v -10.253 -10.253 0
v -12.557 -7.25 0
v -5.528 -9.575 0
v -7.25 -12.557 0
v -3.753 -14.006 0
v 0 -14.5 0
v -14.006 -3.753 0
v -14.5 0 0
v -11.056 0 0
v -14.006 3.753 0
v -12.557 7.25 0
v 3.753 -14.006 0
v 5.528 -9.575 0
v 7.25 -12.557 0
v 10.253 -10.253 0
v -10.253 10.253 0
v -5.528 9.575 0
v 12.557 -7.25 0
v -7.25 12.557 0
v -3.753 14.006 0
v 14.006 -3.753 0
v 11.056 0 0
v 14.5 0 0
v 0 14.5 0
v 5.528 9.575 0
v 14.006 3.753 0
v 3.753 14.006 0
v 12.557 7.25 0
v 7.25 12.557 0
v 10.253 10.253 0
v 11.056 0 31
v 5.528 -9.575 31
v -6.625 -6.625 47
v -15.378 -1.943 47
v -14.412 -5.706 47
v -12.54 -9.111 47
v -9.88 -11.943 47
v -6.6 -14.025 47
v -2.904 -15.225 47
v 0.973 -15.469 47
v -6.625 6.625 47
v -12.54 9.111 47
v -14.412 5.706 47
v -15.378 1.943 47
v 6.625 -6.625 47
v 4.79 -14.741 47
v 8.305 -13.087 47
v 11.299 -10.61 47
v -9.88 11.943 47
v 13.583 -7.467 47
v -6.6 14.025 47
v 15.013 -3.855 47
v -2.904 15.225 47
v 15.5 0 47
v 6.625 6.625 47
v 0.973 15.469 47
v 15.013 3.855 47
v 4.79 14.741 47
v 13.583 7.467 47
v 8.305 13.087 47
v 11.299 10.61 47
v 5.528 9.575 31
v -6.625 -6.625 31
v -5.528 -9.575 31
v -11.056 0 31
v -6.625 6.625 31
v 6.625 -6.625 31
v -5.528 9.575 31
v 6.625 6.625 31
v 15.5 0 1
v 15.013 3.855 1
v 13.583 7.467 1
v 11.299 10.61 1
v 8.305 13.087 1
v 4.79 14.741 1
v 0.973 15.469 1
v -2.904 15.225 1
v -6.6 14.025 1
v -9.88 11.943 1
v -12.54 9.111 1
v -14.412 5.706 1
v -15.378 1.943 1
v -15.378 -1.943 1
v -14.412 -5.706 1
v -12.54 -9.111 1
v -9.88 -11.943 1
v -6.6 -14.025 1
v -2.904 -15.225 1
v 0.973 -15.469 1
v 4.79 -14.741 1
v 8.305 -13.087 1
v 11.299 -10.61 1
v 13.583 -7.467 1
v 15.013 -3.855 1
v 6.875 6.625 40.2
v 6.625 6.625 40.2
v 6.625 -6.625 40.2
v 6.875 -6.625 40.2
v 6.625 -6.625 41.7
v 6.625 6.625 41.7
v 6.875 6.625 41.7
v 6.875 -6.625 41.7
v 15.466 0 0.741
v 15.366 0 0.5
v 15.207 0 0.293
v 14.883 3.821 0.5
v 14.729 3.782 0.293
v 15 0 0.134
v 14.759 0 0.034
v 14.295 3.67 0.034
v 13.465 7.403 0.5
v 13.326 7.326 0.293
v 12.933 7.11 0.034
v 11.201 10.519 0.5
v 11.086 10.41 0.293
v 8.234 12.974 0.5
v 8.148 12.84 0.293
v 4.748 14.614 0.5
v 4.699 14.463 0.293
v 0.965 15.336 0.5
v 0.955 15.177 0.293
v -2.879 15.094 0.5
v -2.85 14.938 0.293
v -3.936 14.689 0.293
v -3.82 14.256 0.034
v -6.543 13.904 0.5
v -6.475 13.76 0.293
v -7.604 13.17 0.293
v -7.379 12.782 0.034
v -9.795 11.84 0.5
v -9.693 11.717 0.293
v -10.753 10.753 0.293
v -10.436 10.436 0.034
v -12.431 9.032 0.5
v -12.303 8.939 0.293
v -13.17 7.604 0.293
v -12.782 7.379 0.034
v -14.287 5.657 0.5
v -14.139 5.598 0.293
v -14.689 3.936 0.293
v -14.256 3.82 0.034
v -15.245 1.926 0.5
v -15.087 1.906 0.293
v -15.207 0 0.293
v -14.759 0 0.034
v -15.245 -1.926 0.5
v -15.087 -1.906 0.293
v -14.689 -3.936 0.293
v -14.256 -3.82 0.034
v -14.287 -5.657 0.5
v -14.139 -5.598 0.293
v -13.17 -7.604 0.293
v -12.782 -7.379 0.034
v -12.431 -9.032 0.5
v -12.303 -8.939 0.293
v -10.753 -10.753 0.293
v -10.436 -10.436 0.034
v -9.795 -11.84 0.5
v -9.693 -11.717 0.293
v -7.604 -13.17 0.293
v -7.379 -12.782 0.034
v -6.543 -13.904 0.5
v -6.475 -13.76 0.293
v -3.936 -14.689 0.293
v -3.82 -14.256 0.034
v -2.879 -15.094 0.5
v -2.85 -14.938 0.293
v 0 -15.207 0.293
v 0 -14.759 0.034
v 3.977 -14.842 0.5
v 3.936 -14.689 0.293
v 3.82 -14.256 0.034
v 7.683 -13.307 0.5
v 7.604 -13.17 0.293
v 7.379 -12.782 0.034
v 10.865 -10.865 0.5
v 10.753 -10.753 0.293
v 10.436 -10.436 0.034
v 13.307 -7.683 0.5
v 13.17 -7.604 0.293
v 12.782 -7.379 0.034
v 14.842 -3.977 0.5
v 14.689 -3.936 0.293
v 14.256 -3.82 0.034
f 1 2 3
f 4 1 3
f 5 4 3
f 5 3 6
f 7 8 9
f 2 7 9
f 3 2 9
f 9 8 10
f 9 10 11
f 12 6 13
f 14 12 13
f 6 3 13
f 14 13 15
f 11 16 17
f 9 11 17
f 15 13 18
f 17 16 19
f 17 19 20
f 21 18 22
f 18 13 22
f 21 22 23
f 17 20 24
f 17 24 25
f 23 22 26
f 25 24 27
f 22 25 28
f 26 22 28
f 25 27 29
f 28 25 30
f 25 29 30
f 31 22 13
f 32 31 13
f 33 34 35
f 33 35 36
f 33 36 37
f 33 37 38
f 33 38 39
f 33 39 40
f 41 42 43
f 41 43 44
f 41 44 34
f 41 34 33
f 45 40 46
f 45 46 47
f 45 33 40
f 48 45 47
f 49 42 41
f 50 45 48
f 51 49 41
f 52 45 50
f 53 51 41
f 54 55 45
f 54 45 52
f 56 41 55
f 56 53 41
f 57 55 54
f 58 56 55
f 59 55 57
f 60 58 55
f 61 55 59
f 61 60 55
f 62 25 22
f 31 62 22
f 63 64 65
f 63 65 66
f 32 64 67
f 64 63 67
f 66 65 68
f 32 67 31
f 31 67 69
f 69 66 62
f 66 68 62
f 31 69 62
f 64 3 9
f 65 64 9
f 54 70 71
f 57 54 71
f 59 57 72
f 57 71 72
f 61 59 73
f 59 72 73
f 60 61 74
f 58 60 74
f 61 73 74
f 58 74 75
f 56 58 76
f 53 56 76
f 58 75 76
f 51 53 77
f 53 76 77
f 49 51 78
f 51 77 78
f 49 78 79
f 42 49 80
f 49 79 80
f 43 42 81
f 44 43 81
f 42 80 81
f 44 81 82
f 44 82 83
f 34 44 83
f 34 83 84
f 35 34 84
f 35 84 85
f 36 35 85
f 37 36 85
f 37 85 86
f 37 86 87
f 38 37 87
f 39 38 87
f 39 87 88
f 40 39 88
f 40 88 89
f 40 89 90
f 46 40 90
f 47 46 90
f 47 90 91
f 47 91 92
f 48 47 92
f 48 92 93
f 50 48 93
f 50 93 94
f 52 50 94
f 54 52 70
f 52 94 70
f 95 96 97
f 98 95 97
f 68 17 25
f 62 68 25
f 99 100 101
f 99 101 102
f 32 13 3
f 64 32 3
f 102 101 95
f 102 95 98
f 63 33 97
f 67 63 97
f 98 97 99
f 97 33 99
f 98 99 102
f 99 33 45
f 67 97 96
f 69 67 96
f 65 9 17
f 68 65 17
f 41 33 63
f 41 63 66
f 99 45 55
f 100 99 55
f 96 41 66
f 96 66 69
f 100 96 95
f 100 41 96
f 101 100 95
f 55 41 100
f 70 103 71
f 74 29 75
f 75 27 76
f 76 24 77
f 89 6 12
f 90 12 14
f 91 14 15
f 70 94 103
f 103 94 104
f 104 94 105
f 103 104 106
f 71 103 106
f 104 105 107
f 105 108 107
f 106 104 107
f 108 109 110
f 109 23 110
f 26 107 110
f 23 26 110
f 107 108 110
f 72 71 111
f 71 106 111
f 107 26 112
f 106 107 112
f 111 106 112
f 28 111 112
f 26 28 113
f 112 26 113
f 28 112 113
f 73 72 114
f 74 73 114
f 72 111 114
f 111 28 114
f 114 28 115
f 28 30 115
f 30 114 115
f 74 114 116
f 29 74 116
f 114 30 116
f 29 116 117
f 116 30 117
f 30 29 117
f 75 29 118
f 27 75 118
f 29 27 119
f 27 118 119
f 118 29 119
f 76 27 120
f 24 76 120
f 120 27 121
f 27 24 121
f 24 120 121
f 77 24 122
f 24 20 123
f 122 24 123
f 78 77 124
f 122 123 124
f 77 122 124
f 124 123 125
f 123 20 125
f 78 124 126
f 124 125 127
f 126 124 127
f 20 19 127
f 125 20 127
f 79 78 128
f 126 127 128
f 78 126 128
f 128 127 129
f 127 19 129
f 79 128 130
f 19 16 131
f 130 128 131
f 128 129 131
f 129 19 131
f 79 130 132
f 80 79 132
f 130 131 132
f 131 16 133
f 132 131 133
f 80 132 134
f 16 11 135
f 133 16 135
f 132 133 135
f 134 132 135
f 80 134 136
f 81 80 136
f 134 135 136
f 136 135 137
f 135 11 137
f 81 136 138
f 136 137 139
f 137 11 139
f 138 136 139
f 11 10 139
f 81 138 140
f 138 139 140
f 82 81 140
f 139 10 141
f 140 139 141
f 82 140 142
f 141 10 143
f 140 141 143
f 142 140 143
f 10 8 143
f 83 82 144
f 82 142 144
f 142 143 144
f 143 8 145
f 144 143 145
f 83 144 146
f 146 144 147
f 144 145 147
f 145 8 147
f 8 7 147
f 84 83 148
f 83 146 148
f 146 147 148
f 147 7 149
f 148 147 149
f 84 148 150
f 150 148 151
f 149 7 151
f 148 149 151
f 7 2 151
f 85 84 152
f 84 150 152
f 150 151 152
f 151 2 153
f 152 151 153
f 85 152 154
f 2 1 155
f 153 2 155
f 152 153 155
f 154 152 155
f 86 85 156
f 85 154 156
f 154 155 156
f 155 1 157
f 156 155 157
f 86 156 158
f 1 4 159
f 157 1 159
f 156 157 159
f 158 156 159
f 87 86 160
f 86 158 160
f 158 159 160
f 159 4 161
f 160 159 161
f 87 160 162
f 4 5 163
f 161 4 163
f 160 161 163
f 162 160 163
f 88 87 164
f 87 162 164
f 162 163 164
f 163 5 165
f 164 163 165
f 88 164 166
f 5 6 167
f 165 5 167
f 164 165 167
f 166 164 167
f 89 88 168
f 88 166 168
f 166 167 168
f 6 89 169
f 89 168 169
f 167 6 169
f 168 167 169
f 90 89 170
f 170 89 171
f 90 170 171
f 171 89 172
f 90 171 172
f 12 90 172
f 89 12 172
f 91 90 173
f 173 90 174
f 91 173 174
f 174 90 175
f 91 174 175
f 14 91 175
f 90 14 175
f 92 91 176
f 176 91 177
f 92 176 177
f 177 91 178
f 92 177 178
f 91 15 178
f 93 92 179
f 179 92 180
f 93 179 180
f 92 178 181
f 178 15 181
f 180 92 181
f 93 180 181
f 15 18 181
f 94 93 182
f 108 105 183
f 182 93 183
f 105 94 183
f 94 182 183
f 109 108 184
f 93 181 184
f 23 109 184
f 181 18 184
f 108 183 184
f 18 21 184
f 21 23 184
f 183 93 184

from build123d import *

# Parameters (mm, degrees)
F0_R     = 15.5
F1_DEPTH = 31
F2_R     = 15.5
F3_DEPTH = 16
F4_W     = 13.25
F4_H     = 13.25
F5_DEPTH = 16
F6_W     = 13.25
F6_H     = 1.5
F7_DEPTH = 0.25
F8_R     = 1


with BuildPart() as f1:
    # F0 (on Top) → F1 (new body)
    with BuildSketch(Plane.XY):
        Circle(F0_R)
        Polygon((-5.528129, 9.575), (5.528129, 9.575), (11.056258, 0), (5.528129, -9.575), (-5.528129, -9.575), (-11.056258, 0), align=None, mode=Mode.SUBTRACT)
    extrude(amount=F1_DEPTH)

    # F2 (on face) → F3 (join)
    with BuildSketch(Plane.XY.offset(31)):
        Circle(F2_R)
    extrude(amount=F3_DEPTH)

    # F4 (on face) → F5 (cut, through all)
    with BuildSketch(Plane.XY.offset(47)):
        Rectangle(F4_W, F4_H)
    extrude(amount=-F5_DEPTH, mode=Mode.SUBTRACT)

    # F6 (on face) → F7 (cut)
    with BuildSketch(Plane(origin=(6.625, 0, 0), x_dir=(0, -1, 0), z_dir=(-1, 0, 0))):
        with Locations((0, 40.95)):
            Rectangle(F6_W, F6_H)
    extrude(amount=-F7_DEPTH, mode=Mode.SUBTRACT)

    # F8
    f8_edges = [f1.edges().sort_by_distance(p)[0] for p in [
        (-15.5, 0, 0),
    ]]
    fillet(f8_edges, radius=F8_R)


solid = f1.part
